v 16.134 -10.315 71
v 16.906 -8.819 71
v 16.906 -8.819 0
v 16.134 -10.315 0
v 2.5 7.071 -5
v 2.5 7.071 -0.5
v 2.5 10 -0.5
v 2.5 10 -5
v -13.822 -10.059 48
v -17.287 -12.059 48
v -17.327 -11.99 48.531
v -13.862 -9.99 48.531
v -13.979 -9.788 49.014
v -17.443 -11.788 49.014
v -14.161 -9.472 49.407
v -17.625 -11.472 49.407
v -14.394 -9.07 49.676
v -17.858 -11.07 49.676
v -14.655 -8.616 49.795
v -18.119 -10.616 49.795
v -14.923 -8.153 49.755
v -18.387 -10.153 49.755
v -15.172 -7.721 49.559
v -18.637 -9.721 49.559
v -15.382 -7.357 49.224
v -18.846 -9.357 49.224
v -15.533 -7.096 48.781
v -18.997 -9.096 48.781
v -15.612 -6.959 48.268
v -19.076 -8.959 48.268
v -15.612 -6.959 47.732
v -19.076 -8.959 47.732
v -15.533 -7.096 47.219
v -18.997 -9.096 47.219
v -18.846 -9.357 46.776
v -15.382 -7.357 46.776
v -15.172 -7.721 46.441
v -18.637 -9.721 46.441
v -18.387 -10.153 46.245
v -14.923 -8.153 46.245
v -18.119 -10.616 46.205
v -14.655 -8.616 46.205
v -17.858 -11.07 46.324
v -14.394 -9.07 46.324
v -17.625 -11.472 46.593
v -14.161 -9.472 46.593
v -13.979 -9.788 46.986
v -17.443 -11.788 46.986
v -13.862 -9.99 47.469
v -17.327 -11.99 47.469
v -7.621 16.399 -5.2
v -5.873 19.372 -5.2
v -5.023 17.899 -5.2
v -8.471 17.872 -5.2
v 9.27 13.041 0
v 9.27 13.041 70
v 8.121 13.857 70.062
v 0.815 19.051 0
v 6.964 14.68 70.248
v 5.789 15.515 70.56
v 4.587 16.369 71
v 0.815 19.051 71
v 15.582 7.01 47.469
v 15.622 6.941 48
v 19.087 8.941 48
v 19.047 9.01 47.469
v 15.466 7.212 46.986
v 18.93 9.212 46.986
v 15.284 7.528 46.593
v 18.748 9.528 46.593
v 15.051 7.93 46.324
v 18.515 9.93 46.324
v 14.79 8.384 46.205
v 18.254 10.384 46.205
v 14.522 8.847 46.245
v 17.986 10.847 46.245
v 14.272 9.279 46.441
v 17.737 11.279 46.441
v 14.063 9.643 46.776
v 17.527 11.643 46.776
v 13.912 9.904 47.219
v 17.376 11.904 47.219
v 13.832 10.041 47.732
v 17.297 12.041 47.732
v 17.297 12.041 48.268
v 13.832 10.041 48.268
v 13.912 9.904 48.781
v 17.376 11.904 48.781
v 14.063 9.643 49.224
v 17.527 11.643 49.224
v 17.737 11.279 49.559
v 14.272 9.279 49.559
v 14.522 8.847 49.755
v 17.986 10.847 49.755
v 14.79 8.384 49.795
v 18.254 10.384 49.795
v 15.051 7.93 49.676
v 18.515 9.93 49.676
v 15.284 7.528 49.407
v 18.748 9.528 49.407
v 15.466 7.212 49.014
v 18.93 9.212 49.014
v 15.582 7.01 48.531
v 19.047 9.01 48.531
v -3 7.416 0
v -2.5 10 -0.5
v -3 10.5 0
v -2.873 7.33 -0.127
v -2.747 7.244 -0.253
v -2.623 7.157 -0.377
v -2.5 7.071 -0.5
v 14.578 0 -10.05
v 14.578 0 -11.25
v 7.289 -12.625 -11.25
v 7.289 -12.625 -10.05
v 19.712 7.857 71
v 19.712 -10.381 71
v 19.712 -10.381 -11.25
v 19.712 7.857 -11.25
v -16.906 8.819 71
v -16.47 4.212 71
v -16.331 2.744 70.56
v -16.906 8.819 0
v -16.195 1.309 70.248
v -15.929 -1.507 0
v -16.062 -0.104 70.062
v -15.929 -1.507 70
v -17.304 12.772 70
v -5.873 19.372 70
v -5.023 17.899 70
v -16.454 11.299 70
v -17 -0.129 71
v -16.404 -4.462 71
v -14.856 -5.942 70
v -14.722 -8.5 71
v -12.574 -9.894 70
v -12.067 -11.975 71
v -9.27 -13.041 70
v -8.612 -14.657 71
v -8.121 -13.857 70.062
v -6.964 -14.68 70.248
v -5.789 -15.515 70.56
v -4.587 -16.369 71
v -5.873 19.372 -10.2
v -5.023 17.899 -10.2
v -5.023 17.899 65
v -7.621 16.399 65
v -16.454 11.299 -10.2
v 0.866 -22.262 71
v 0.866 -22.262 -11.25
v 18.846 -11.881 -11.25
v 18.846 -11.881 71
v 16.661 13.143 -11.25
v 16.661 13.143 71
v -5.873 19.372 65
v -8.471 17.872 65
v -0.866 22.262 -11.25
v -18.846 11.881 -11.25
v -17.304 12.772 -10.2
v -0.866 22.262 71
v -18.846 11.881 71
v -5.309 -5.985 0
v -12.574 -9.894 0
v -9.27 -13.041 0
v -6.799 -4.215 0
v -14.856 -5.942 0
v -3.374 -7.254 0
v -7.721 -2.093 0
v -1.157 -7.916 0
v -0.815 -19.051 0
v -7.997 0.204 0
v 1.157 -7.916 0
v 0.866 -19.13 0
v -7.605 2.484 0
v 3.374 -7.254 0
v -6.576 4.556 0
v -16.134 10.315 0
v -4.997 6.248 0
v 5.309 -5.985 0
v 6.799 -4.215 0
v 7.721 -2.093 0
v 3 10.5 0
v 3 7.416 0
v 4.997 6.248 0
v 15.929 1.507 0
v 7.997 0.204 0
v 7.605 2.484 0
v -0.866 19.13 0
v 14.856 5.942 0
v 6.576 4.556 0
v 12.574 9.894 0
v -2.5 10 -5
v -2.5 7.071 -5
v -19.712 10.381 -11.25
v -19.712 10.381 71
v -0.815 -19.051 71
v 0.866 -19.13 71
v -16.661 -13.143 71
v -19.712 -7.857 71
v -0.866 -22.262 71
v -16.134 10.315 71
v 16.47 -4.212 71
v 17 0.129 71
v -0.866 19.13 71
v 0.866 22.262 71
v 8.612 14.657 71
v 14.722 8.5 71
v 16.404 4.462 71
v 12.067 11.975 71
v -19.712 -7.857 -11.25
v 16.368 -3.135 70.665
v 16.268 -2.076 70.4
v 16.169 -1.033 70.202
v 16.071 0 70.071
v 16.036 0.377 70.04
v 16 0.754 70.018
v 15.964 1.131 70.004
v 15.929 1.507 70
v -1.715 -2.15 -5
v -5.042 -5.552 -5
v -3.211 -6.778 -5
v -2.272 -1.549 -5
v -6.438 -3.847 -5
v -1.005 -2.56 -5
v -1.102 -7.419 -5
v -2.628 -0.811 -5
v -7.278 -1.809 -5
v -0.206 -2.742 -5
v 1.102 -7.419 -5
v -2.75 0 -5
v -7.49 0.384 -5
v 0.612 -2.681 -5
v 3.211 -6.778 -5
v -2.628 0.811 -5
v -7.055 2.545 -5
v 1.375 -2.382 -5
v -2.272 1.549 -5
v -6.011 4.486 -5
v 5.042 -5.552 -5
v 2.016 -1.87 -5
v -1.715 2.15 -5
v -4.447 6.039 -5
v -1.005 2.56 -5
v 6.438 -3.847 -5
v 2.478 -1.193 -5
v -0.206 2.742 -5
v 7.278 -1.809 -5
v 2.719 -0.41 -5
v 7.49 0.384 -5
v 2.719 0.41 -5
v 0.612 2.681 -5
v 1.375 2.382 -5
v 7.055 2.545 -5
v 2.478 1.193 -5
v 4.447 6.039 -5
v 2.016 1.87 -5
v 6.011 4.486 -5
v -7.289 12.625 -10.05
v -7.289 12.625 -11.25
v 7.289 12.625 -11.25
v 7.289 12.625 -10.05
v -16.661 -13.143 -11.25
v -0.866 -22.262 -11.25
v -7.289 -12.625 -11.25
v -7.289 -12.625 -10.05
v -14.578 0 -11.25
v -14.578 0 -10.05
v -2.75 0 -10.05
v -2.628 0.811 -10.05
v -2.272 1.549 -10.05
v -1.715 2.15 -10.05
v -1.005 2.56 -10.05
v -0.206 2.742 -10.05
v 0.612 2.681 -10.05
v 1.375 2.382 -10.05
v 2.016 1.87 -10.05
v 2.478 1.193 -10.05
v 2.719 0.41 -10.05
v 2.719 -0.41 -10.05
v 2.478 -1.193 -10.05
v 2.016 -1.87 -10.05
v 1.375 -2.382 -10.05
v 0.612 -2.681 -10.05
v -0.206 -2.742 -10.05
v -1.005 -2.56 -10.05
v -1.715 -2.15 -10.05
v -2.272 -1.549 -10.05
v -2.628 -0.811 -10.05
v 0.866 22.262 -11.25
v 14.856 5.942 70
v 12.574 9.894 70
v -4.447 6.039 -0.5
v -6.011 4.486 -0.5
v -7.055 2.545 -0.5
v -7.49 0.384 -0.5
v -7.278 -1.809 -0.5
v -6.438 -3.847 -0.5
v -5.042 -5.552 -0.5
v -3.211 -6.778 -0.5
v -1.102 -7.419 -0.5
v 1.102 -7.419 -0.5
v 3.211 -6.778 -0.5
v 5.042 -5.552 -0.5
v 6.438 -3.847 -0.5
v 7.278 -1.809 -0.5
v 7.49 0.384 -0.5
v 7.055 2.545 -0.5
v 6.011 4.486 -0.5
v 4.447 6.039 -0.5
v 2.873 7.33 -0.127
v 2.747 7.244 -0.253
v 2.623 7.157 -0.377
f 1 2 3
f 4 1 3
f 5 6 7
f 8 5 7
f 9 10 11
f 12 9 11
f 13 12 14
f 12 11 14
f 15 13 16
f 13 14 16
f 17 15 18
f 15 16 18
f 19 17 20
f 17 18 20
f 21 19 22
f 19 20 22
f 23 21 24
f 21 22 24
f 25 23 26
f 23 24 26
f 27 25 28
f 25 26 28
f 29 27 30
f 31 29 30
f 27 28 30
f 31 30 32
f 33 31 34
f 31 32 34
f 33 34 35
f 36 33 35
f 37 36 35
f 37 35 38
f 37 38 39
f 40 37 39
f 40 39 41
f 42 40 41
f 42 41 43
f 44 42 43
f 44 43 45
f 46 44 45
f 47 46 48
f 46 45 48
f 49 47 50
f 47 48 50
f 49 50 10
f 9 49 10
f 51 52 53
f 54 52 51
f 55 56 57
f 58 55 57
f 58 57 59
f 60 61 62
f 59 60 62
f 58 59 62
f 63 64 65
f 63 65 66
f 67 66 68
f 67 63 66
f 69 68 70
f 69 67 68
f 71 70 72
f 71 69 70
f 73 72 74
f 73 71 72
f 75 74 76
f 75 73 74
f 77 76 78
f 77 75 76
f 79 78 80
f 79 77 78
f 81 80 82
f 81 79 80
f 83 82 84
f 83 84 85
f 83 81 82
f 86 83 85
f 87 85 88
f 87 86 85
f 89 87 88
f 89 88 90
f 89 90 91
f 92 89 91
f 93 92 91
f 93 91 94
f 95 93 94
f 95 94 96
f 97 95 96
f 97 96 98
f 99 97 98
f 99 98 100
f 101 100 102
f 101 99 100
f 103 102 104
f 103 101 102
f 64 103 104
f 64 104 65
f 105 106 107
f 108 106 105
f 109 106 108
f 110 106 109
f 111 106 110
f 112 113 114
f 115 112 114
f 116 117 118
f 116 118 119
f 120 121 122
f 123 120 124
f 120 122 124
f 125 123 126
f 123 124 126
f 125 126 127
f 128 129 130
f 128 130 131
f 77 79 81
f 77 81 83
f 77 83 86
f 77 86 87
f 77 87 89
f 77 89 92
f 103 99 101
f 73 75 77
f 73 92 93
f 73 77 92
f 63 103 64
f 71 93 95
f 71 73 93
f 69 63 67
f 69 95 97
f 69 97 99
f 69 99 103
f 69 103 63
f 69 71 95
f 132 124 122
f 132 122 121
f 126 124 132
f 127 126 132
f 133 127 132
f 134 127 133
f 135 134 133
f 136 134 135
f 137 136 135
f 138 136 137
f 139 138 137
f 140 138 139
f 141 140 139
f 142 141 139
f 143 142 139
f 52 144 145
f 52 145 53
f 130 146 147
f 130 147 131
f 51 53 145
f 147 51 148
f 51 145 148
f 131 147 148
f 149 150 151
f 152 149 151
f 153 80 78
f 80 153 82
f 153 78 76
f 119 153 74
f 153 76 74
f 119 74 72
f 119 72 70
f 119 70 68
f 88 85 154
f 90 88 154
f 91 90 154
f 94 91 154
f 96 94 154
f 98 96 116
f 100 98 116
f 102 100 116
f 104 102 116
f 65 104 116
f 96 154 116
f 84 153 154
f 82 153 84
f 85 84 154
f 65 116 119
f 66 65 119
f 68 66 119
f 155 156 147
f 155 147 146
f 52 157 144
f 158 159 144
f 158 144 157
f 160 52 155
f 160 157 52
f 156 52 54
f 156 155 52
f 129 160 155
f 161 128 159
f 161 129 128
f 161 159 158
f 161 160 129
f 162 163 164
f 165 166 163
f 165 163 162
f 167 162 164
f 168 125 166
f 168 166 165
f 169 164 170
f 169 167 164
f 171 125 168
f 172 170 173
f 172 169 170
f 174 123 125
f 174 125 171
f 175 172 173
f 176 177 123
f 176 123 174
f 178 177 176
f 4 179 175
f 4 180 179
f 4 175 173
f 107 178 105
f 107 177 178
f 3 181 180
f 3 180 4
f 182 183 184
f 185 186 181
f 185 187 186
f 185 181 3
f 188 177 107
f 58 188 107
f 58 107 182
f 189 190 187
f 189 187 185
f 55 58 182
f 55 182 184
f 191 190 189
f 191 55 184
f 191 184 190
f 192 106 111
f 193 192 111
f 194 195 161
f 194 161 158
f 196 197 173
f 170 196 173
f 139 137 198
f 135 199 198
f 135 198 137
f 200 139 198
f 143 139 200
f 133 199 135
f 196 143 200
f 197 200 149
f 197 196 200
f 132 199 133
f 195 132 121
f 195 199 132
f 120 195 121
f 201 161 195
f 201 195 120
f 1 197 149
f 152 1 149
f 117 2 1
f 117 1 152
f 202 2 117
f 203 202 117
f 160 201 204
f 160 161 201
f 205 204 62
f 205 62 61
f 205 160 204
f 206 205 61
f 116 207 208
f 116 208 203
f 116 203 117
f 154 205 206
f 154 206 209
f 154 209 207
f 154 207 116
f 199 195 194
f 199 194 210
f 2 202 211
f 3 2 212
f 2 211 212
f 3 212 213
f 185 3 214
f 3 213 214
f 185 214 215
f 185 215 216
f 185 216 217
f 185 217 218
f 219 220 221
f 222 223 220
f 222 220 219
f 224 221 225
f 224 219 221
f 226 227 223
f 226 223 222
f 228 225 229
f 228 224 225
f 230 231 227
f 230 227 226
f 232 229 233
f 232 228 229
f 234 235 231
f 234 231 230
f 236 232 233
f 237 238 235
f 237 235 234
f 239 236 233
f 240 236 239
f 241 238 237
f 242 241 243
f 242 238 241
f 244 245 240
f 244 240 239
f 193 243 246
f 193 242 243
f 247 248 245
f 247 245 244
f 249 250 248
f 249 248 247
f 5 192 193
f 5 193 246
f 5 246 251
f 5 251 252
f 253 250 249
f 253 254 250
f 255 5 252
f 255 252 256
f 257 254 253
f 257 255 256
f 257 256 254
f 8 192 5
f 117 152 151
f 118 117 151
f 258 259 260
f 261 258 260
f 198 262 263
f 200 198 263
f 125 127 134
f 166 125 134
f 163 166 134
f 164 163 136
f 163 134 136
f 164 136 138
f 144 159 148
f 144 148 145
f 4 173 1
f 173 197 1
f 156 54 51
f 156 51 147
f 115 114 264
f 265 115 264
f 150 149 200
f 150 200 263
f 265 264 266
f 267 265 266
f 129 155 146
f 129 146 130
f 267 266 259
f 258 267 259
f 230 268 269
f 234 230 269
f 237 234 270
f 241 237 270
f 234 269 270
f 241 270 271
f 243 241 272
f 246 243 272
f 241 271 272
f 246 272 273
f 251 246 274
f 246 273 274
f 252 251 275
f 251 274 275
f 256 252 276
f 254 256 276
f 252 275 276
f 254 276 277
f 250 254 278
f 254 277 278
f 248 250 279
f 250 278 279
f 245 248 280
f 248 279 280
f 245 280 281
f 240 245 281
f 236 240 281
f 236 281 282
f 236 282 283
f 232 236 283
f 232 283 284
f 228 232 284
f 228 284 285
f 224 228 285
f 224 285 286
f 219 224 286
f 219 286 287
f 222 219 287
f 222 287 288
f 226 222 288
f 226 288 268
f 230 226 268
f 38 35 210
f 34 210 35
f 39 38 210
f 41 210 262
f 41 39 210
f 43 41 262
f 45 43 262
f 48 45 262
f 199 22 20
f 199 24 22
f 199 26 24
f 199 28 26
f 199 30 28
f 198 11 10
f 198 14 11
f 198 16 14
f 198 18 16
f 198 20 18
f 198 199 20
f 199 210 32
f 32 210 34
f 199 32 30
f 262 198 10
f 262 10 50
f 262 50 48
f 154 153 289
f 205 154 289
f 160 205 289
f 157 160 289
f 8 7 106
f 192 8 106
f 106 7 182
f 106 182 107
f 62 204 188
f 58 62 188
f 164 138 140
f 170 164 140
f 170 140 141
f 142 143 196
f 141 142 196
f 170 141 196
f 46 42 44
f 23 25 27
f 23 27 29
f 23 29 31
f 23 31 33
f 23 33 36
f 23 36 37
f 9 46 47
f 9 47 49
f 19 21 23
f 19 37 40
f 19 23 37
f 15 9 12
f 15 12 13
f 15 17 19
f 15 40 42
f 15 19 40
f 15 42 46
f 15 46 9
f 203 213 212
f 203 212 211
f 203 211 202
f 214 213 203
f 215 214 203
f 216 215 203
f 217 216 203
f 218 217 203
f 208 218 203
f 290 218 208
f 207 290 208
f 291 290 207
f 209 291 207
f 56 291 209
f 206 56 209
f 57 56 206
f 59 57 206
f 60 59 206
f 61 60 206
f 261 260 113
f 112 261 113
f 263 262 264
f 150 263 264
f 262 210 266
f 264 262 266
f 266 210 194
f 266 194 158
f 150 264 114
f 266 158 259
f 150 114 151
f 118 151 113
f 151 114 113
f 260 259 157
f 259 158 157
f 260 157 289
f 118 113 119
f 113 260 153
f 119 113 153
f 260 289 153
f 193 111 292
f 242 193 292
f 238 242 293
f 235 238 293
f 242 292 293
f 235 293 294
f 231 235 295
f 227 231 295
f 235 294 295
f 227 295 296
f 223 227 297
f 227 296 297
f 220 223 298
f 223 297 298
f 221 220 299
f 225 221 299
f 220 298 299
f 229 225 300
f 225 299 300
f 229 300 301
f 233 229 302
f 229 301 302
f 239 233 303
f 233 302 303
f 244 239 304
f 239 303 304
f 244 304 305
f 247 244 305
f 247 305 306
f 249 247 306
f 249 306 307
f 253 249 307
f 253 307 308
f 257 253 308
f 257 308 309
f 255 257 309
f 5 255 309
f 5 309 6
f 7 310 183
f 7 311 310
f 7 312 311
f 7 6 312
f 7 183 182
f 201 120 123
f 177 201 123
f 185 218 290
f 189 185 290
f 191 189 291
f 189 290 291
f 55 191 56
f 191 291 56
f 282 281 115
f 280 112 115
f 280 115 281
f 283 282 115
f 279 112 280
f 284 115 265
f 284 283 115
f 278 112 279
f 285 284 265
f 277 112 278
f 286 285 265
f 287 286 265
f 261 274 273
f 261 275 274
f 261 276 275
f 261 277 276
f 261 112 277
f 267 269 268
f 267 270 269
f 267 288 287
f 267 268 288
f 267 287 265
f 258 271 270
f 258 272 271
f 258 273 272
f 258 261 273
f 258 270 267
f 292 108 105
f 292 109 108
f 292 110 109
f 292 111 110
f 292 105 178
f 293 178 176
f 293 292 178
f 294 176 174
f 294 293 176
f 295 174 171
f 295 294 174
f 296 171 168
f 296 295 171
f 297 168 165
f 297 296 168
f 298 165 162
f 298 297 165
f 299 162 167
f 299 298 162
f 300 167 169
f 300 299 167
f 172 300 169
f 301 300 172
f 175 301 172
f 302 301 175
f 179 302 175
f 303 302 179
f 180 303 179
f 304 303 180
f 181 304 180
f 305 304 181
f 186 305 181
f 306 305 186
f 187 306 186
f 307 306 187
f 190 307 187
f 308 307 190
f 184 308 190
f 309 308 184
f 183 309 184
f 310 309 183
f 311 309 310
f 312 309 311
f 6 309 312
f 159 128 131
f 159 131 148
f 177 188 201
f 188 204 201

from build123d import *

# Parameters (mm, degrees)
SKETCH2_R               = 16
BOSS_EXTRUDE1_DEPTH     = 82.25
CUT_EXTRUDE1_DEPTH      = 97.457244414
CUT_EXTRUDE1_DEPTH_BACK = 97.457244414
SKETCH3_W               = 152.01959988
SKETCH3_H               = 124.433031562
CUT_EXTRUDE2_DEPTH      = 1.7
CHAMFER2_SIZE           = 1
CHAMFER3_SIZE           = 1
CUT_EXTRUDE3_DEPTH      = 71
CHAMFER4_SIZE           = 1
CUT_EXTRUDE4_DEPTH      = 1.2
SKETCH8_R               = 2.75
CUT_EXTRUDE5_DEPTH      = 87.332400234
CUT_EXTRUDE7_DEPTH      = 5
CHAMFER5_SIZE           = 0.5
CUT_EXTRUDE8_DEPTH      = 88.459952722
SKETCH12_R              = 1.8
CUT_EXTRUDE9_DEPTH      = 4
CUT_EXTRUDE10_START     = -4
SKETCH13_R              = 1.8
CUT_EXTRUDE10_DEPTH     = 4


with BuildPart() as part:
    # Sketch1 → Revolve1 (revolve)
    with BuildSketch(Plane(origin=(0, 0, 0), x_dir=(1, 0, 0), z_dir=(0, 1, 0))):
        Polygon((0, 0), (16.125, 0), (16.125, -71), (19.65, -71), (19.65, 68), (24.95, 68), (24.95, 73), (28.1, 73), (28.1, 68), (42, 68), (42, 76), (16.65, 76), (16.65, 18.004366875), (12.193967069, 18.004366875), (12.193967069, 24.882682167), (0, 24.882682167), align=None)
    revolve(axis=Axis((0, 0, 39.840023079), (0, 0, -1)))

    # Sketch2 → Boss-Extrude1 (add)
    with BuildSketch(Plane.XY.offset(71)):
        Polygon((0, 22.762034363), (-19.7125, 11.381017181), (-19.7125, -11.381017181), (0, -22.762034363), (19.7125, -11.381017181), (19.7125, 11.381017181), align=None)
        Circle(SKETCH2_R, mode=Mode.SUBTRACT)
    extrude(amount=-BOSS_EXTRUDE1_DEPTH)

    # Sketch3 → Cut-Extrude1 (cut, two sides: drawn at the far end of the back side and taken through both)
    with BuildSketch(Plane(origin=(0, 0, 0), x_dir=(1, 0, 0), z_dir=(0, 1, 0)).offset(-CUT_EXTRUDE1_DEPTH_BACK)):
        with Locations((6.162956752, 73.466515781)):
            Rectangle(SKETCH3_W, SKETCH3_H)
    extrude(amount=CUT_EXTRUDE1_DEPTH + CUT_EXTRUDE1_DEPTH_BACK, mode=Mode.SUBTRACT)

    # Sketch4 → Cut-Extrude2 (cut)
    with BuildSketch(Plane(origin=(-9.85625, 17.071525772, 0), x_dir=(0.8660254037844386, 0.5000000000000003, 0), z_dir=(-0.5000000000000002, 0.8660254037844385, 0))):
        Polygon((-8.6, 10.2), (4.6, 10.2), (4.6, 5.2), (1.6, 5.2), (1.6, -65), (4.6, -65), (4.6, -70), (-8.6, -70), align=None)
    extrude(amount=-CUT_EXTRUDE2_DEPTH, mode=Mode.SUBTRACT)

    # Chamfer2
    chamfer2_edges = [part.edges().sort_by_distance(p)[0] for p in [
        (0, 22.762034363, 29.875),
        (19.7125, 11.381017181, 29.875),
        (19.7125, -11.381017181, 29.875),
        (0, -22.762034363, 29.875),
        (-19.7125, -11.381017181, 29.875),
        (-19.7125, 11.381017181, 29.875),
    ]]
    chamfer(chamfer2_edges, length=CHAMFER2_SIZE)

    # Chamfer3
    chamfer3_edges = [part.edges().sort_by_distance(p)[0] for p in [
        (-16, 0, 71),
    ]]
    chamfer(chamfer3_edges, length=CHAMFER3_SIZE)

    # Sketch5 → Cut-Extrude3 (cut)
    with BuildSketch(Plane.XY.offset(71)):
        with BuildLine():
            Line((-17, 9.814954576), (-15.92887426, -1.50697207))
            ThreePointArc((-15.92887426, -1.50697207), (-8, 13.85640646), (9.269513225, 13.041323728))
            Line((9.269513225, 13.041323728), (0, 19.629909152))
            Line((0, 19.629909152), (-17, 9.814954576))
        make_face()
        with BuildLine():
            Line((0, -19.629909152), (17, -9.814954576))
            Line((17, -9.814954576), (15.92887426, 1.50697207))
            ThreePointArc((15.92887426, 1.50697207), (8, -13.856406461), (-9.269513225, -13.041323728))
            Line((-9.269513225, -13.041323728), (0, -19.629909152))
        make_face()
    extrude(amount=-CUT_EXTRUDE3_DEPTH, mode=Mode.SUBTRACT)

    # Chamfer4
    chamfer4_edges = [part.edges().sort_by_distance(p)[0] for p in [
        (0, -19.629909152, 35.5),
        (17, -9.814954576, 35.5),
        (0, 19.629909152, 35.5),
        (-17, 9.814954576, 35.5),
    ]]
    chamfer(chamfer4_edges, length=CHAMFER4_SIZE)

    # Sketch6 → Cut-Extrude4 (cut)
    with BuildSketch(Plane(origin=(0, 0, -11.25), x_dir=(-1, 0, 0), z_dir=(0, 0, -1))):
        Polygon((-7.289047149, 12.625), (-14.578094297, 0), (-7.289047149, -12.625), (7.289047149, -12.625), (14.578094297, 0), (7.289047149, 12.625), align=None)
    extrude(amount=-CUT_EXTRUDE4_DEPTH, mode=Mode.SUBTRACT)

    # Sketch8 → Cut-Extrude5 (cut, through all)
    with BuildSketch(Plane(origin=(0, 0, -10.05), x_dir=(-1, 0, 0), z_dir=(0, 0, -1))):
        Circle(SKETCH8_R)
    extrude(amount=-CUT_EXTRUDE5_DEPTH, mode=Mode.SUBTRACT)

    # Sketch10 → Cut-Extrude7 (cut)
    with BuildSketch(Plane.XY):
        with BuildLine():
            Line((2.5, 10), (-2.5, 10))
            Line((-2.5, 10), (-2.5, 7.071067812))
            ThreePointArc((-2.5, 7.071067812), (0, -7.5), (2.5, 7.071067812))
            Line((2.5, 7.071067812), (2.5, 10))
        make_face()
    extrude(amount=-CUT_EXTRUDE7_DEPTH, mode=Mode.SUBTRACT)

    # Chamfer5
    chamfer5_edges = [part.edges().sort_by_distance(p)[0] for p in [
        (0, -7.5, 0),
        (2.5, 8.535533906, 0),
        (0, 10, 0),
        (-2.5, 8.535533906, 0),
    ]]
    chamfer(chamfer5_edges, length=CHAMFER5_SIZE)

    # Sketch11 → Cut-Extrude8 (cut, through all)
    with BuildSketch(Plane.XY.offset(71)):
        Polygon((19.7125, 11.381017181), (16.660566959, 13.143051544), (19.7125, 7.856948456), align=None)
        Polygon((-16.660566959, -13.143051544), (-19.7125, -11.381017181), (-19.7125, -7.856948456), align=None)
    extrude(amount=-CUT_EXTRUDE8_DEPTH, mode=Mode.SUBTRACT)

    # Sketch12 → Cut-Extrude9 (cut)
    with BuildSketch(Plane(origin=(-18.186533479, -10.5, 0), x_dir=(0, 0, 1), z_dir=(-0.8660254037844382, -0.500000000000001, 0))):
        with Locations(Location((48, 0, 0), (0, 0, 270))):
            Circle(SKETCH12_R)
    extrude(amount=-CUT_EXTRUDE9_DEPTH, mode=Mode.SUBTRACT)

    # Sketch13 → Cut-Extrude10 (cut)
    with BuildSketch(Plane(origin=(18.186533479, 10.5, 0), x_dir=(0, 0, -1), z_dir=(0.8660254037844387, 0.4999999999999999, 0)).offset(CUT_EXTRUDE10_START)):
        with Locations(Location((-48, 0, 0), (0, 0, 270))):
            Circle(SKETCH13_R)
    extrude(amount=CUT_EXTRUDE10_DEPTH, mode=Mode.SUBTRACT)


solid = part.part
